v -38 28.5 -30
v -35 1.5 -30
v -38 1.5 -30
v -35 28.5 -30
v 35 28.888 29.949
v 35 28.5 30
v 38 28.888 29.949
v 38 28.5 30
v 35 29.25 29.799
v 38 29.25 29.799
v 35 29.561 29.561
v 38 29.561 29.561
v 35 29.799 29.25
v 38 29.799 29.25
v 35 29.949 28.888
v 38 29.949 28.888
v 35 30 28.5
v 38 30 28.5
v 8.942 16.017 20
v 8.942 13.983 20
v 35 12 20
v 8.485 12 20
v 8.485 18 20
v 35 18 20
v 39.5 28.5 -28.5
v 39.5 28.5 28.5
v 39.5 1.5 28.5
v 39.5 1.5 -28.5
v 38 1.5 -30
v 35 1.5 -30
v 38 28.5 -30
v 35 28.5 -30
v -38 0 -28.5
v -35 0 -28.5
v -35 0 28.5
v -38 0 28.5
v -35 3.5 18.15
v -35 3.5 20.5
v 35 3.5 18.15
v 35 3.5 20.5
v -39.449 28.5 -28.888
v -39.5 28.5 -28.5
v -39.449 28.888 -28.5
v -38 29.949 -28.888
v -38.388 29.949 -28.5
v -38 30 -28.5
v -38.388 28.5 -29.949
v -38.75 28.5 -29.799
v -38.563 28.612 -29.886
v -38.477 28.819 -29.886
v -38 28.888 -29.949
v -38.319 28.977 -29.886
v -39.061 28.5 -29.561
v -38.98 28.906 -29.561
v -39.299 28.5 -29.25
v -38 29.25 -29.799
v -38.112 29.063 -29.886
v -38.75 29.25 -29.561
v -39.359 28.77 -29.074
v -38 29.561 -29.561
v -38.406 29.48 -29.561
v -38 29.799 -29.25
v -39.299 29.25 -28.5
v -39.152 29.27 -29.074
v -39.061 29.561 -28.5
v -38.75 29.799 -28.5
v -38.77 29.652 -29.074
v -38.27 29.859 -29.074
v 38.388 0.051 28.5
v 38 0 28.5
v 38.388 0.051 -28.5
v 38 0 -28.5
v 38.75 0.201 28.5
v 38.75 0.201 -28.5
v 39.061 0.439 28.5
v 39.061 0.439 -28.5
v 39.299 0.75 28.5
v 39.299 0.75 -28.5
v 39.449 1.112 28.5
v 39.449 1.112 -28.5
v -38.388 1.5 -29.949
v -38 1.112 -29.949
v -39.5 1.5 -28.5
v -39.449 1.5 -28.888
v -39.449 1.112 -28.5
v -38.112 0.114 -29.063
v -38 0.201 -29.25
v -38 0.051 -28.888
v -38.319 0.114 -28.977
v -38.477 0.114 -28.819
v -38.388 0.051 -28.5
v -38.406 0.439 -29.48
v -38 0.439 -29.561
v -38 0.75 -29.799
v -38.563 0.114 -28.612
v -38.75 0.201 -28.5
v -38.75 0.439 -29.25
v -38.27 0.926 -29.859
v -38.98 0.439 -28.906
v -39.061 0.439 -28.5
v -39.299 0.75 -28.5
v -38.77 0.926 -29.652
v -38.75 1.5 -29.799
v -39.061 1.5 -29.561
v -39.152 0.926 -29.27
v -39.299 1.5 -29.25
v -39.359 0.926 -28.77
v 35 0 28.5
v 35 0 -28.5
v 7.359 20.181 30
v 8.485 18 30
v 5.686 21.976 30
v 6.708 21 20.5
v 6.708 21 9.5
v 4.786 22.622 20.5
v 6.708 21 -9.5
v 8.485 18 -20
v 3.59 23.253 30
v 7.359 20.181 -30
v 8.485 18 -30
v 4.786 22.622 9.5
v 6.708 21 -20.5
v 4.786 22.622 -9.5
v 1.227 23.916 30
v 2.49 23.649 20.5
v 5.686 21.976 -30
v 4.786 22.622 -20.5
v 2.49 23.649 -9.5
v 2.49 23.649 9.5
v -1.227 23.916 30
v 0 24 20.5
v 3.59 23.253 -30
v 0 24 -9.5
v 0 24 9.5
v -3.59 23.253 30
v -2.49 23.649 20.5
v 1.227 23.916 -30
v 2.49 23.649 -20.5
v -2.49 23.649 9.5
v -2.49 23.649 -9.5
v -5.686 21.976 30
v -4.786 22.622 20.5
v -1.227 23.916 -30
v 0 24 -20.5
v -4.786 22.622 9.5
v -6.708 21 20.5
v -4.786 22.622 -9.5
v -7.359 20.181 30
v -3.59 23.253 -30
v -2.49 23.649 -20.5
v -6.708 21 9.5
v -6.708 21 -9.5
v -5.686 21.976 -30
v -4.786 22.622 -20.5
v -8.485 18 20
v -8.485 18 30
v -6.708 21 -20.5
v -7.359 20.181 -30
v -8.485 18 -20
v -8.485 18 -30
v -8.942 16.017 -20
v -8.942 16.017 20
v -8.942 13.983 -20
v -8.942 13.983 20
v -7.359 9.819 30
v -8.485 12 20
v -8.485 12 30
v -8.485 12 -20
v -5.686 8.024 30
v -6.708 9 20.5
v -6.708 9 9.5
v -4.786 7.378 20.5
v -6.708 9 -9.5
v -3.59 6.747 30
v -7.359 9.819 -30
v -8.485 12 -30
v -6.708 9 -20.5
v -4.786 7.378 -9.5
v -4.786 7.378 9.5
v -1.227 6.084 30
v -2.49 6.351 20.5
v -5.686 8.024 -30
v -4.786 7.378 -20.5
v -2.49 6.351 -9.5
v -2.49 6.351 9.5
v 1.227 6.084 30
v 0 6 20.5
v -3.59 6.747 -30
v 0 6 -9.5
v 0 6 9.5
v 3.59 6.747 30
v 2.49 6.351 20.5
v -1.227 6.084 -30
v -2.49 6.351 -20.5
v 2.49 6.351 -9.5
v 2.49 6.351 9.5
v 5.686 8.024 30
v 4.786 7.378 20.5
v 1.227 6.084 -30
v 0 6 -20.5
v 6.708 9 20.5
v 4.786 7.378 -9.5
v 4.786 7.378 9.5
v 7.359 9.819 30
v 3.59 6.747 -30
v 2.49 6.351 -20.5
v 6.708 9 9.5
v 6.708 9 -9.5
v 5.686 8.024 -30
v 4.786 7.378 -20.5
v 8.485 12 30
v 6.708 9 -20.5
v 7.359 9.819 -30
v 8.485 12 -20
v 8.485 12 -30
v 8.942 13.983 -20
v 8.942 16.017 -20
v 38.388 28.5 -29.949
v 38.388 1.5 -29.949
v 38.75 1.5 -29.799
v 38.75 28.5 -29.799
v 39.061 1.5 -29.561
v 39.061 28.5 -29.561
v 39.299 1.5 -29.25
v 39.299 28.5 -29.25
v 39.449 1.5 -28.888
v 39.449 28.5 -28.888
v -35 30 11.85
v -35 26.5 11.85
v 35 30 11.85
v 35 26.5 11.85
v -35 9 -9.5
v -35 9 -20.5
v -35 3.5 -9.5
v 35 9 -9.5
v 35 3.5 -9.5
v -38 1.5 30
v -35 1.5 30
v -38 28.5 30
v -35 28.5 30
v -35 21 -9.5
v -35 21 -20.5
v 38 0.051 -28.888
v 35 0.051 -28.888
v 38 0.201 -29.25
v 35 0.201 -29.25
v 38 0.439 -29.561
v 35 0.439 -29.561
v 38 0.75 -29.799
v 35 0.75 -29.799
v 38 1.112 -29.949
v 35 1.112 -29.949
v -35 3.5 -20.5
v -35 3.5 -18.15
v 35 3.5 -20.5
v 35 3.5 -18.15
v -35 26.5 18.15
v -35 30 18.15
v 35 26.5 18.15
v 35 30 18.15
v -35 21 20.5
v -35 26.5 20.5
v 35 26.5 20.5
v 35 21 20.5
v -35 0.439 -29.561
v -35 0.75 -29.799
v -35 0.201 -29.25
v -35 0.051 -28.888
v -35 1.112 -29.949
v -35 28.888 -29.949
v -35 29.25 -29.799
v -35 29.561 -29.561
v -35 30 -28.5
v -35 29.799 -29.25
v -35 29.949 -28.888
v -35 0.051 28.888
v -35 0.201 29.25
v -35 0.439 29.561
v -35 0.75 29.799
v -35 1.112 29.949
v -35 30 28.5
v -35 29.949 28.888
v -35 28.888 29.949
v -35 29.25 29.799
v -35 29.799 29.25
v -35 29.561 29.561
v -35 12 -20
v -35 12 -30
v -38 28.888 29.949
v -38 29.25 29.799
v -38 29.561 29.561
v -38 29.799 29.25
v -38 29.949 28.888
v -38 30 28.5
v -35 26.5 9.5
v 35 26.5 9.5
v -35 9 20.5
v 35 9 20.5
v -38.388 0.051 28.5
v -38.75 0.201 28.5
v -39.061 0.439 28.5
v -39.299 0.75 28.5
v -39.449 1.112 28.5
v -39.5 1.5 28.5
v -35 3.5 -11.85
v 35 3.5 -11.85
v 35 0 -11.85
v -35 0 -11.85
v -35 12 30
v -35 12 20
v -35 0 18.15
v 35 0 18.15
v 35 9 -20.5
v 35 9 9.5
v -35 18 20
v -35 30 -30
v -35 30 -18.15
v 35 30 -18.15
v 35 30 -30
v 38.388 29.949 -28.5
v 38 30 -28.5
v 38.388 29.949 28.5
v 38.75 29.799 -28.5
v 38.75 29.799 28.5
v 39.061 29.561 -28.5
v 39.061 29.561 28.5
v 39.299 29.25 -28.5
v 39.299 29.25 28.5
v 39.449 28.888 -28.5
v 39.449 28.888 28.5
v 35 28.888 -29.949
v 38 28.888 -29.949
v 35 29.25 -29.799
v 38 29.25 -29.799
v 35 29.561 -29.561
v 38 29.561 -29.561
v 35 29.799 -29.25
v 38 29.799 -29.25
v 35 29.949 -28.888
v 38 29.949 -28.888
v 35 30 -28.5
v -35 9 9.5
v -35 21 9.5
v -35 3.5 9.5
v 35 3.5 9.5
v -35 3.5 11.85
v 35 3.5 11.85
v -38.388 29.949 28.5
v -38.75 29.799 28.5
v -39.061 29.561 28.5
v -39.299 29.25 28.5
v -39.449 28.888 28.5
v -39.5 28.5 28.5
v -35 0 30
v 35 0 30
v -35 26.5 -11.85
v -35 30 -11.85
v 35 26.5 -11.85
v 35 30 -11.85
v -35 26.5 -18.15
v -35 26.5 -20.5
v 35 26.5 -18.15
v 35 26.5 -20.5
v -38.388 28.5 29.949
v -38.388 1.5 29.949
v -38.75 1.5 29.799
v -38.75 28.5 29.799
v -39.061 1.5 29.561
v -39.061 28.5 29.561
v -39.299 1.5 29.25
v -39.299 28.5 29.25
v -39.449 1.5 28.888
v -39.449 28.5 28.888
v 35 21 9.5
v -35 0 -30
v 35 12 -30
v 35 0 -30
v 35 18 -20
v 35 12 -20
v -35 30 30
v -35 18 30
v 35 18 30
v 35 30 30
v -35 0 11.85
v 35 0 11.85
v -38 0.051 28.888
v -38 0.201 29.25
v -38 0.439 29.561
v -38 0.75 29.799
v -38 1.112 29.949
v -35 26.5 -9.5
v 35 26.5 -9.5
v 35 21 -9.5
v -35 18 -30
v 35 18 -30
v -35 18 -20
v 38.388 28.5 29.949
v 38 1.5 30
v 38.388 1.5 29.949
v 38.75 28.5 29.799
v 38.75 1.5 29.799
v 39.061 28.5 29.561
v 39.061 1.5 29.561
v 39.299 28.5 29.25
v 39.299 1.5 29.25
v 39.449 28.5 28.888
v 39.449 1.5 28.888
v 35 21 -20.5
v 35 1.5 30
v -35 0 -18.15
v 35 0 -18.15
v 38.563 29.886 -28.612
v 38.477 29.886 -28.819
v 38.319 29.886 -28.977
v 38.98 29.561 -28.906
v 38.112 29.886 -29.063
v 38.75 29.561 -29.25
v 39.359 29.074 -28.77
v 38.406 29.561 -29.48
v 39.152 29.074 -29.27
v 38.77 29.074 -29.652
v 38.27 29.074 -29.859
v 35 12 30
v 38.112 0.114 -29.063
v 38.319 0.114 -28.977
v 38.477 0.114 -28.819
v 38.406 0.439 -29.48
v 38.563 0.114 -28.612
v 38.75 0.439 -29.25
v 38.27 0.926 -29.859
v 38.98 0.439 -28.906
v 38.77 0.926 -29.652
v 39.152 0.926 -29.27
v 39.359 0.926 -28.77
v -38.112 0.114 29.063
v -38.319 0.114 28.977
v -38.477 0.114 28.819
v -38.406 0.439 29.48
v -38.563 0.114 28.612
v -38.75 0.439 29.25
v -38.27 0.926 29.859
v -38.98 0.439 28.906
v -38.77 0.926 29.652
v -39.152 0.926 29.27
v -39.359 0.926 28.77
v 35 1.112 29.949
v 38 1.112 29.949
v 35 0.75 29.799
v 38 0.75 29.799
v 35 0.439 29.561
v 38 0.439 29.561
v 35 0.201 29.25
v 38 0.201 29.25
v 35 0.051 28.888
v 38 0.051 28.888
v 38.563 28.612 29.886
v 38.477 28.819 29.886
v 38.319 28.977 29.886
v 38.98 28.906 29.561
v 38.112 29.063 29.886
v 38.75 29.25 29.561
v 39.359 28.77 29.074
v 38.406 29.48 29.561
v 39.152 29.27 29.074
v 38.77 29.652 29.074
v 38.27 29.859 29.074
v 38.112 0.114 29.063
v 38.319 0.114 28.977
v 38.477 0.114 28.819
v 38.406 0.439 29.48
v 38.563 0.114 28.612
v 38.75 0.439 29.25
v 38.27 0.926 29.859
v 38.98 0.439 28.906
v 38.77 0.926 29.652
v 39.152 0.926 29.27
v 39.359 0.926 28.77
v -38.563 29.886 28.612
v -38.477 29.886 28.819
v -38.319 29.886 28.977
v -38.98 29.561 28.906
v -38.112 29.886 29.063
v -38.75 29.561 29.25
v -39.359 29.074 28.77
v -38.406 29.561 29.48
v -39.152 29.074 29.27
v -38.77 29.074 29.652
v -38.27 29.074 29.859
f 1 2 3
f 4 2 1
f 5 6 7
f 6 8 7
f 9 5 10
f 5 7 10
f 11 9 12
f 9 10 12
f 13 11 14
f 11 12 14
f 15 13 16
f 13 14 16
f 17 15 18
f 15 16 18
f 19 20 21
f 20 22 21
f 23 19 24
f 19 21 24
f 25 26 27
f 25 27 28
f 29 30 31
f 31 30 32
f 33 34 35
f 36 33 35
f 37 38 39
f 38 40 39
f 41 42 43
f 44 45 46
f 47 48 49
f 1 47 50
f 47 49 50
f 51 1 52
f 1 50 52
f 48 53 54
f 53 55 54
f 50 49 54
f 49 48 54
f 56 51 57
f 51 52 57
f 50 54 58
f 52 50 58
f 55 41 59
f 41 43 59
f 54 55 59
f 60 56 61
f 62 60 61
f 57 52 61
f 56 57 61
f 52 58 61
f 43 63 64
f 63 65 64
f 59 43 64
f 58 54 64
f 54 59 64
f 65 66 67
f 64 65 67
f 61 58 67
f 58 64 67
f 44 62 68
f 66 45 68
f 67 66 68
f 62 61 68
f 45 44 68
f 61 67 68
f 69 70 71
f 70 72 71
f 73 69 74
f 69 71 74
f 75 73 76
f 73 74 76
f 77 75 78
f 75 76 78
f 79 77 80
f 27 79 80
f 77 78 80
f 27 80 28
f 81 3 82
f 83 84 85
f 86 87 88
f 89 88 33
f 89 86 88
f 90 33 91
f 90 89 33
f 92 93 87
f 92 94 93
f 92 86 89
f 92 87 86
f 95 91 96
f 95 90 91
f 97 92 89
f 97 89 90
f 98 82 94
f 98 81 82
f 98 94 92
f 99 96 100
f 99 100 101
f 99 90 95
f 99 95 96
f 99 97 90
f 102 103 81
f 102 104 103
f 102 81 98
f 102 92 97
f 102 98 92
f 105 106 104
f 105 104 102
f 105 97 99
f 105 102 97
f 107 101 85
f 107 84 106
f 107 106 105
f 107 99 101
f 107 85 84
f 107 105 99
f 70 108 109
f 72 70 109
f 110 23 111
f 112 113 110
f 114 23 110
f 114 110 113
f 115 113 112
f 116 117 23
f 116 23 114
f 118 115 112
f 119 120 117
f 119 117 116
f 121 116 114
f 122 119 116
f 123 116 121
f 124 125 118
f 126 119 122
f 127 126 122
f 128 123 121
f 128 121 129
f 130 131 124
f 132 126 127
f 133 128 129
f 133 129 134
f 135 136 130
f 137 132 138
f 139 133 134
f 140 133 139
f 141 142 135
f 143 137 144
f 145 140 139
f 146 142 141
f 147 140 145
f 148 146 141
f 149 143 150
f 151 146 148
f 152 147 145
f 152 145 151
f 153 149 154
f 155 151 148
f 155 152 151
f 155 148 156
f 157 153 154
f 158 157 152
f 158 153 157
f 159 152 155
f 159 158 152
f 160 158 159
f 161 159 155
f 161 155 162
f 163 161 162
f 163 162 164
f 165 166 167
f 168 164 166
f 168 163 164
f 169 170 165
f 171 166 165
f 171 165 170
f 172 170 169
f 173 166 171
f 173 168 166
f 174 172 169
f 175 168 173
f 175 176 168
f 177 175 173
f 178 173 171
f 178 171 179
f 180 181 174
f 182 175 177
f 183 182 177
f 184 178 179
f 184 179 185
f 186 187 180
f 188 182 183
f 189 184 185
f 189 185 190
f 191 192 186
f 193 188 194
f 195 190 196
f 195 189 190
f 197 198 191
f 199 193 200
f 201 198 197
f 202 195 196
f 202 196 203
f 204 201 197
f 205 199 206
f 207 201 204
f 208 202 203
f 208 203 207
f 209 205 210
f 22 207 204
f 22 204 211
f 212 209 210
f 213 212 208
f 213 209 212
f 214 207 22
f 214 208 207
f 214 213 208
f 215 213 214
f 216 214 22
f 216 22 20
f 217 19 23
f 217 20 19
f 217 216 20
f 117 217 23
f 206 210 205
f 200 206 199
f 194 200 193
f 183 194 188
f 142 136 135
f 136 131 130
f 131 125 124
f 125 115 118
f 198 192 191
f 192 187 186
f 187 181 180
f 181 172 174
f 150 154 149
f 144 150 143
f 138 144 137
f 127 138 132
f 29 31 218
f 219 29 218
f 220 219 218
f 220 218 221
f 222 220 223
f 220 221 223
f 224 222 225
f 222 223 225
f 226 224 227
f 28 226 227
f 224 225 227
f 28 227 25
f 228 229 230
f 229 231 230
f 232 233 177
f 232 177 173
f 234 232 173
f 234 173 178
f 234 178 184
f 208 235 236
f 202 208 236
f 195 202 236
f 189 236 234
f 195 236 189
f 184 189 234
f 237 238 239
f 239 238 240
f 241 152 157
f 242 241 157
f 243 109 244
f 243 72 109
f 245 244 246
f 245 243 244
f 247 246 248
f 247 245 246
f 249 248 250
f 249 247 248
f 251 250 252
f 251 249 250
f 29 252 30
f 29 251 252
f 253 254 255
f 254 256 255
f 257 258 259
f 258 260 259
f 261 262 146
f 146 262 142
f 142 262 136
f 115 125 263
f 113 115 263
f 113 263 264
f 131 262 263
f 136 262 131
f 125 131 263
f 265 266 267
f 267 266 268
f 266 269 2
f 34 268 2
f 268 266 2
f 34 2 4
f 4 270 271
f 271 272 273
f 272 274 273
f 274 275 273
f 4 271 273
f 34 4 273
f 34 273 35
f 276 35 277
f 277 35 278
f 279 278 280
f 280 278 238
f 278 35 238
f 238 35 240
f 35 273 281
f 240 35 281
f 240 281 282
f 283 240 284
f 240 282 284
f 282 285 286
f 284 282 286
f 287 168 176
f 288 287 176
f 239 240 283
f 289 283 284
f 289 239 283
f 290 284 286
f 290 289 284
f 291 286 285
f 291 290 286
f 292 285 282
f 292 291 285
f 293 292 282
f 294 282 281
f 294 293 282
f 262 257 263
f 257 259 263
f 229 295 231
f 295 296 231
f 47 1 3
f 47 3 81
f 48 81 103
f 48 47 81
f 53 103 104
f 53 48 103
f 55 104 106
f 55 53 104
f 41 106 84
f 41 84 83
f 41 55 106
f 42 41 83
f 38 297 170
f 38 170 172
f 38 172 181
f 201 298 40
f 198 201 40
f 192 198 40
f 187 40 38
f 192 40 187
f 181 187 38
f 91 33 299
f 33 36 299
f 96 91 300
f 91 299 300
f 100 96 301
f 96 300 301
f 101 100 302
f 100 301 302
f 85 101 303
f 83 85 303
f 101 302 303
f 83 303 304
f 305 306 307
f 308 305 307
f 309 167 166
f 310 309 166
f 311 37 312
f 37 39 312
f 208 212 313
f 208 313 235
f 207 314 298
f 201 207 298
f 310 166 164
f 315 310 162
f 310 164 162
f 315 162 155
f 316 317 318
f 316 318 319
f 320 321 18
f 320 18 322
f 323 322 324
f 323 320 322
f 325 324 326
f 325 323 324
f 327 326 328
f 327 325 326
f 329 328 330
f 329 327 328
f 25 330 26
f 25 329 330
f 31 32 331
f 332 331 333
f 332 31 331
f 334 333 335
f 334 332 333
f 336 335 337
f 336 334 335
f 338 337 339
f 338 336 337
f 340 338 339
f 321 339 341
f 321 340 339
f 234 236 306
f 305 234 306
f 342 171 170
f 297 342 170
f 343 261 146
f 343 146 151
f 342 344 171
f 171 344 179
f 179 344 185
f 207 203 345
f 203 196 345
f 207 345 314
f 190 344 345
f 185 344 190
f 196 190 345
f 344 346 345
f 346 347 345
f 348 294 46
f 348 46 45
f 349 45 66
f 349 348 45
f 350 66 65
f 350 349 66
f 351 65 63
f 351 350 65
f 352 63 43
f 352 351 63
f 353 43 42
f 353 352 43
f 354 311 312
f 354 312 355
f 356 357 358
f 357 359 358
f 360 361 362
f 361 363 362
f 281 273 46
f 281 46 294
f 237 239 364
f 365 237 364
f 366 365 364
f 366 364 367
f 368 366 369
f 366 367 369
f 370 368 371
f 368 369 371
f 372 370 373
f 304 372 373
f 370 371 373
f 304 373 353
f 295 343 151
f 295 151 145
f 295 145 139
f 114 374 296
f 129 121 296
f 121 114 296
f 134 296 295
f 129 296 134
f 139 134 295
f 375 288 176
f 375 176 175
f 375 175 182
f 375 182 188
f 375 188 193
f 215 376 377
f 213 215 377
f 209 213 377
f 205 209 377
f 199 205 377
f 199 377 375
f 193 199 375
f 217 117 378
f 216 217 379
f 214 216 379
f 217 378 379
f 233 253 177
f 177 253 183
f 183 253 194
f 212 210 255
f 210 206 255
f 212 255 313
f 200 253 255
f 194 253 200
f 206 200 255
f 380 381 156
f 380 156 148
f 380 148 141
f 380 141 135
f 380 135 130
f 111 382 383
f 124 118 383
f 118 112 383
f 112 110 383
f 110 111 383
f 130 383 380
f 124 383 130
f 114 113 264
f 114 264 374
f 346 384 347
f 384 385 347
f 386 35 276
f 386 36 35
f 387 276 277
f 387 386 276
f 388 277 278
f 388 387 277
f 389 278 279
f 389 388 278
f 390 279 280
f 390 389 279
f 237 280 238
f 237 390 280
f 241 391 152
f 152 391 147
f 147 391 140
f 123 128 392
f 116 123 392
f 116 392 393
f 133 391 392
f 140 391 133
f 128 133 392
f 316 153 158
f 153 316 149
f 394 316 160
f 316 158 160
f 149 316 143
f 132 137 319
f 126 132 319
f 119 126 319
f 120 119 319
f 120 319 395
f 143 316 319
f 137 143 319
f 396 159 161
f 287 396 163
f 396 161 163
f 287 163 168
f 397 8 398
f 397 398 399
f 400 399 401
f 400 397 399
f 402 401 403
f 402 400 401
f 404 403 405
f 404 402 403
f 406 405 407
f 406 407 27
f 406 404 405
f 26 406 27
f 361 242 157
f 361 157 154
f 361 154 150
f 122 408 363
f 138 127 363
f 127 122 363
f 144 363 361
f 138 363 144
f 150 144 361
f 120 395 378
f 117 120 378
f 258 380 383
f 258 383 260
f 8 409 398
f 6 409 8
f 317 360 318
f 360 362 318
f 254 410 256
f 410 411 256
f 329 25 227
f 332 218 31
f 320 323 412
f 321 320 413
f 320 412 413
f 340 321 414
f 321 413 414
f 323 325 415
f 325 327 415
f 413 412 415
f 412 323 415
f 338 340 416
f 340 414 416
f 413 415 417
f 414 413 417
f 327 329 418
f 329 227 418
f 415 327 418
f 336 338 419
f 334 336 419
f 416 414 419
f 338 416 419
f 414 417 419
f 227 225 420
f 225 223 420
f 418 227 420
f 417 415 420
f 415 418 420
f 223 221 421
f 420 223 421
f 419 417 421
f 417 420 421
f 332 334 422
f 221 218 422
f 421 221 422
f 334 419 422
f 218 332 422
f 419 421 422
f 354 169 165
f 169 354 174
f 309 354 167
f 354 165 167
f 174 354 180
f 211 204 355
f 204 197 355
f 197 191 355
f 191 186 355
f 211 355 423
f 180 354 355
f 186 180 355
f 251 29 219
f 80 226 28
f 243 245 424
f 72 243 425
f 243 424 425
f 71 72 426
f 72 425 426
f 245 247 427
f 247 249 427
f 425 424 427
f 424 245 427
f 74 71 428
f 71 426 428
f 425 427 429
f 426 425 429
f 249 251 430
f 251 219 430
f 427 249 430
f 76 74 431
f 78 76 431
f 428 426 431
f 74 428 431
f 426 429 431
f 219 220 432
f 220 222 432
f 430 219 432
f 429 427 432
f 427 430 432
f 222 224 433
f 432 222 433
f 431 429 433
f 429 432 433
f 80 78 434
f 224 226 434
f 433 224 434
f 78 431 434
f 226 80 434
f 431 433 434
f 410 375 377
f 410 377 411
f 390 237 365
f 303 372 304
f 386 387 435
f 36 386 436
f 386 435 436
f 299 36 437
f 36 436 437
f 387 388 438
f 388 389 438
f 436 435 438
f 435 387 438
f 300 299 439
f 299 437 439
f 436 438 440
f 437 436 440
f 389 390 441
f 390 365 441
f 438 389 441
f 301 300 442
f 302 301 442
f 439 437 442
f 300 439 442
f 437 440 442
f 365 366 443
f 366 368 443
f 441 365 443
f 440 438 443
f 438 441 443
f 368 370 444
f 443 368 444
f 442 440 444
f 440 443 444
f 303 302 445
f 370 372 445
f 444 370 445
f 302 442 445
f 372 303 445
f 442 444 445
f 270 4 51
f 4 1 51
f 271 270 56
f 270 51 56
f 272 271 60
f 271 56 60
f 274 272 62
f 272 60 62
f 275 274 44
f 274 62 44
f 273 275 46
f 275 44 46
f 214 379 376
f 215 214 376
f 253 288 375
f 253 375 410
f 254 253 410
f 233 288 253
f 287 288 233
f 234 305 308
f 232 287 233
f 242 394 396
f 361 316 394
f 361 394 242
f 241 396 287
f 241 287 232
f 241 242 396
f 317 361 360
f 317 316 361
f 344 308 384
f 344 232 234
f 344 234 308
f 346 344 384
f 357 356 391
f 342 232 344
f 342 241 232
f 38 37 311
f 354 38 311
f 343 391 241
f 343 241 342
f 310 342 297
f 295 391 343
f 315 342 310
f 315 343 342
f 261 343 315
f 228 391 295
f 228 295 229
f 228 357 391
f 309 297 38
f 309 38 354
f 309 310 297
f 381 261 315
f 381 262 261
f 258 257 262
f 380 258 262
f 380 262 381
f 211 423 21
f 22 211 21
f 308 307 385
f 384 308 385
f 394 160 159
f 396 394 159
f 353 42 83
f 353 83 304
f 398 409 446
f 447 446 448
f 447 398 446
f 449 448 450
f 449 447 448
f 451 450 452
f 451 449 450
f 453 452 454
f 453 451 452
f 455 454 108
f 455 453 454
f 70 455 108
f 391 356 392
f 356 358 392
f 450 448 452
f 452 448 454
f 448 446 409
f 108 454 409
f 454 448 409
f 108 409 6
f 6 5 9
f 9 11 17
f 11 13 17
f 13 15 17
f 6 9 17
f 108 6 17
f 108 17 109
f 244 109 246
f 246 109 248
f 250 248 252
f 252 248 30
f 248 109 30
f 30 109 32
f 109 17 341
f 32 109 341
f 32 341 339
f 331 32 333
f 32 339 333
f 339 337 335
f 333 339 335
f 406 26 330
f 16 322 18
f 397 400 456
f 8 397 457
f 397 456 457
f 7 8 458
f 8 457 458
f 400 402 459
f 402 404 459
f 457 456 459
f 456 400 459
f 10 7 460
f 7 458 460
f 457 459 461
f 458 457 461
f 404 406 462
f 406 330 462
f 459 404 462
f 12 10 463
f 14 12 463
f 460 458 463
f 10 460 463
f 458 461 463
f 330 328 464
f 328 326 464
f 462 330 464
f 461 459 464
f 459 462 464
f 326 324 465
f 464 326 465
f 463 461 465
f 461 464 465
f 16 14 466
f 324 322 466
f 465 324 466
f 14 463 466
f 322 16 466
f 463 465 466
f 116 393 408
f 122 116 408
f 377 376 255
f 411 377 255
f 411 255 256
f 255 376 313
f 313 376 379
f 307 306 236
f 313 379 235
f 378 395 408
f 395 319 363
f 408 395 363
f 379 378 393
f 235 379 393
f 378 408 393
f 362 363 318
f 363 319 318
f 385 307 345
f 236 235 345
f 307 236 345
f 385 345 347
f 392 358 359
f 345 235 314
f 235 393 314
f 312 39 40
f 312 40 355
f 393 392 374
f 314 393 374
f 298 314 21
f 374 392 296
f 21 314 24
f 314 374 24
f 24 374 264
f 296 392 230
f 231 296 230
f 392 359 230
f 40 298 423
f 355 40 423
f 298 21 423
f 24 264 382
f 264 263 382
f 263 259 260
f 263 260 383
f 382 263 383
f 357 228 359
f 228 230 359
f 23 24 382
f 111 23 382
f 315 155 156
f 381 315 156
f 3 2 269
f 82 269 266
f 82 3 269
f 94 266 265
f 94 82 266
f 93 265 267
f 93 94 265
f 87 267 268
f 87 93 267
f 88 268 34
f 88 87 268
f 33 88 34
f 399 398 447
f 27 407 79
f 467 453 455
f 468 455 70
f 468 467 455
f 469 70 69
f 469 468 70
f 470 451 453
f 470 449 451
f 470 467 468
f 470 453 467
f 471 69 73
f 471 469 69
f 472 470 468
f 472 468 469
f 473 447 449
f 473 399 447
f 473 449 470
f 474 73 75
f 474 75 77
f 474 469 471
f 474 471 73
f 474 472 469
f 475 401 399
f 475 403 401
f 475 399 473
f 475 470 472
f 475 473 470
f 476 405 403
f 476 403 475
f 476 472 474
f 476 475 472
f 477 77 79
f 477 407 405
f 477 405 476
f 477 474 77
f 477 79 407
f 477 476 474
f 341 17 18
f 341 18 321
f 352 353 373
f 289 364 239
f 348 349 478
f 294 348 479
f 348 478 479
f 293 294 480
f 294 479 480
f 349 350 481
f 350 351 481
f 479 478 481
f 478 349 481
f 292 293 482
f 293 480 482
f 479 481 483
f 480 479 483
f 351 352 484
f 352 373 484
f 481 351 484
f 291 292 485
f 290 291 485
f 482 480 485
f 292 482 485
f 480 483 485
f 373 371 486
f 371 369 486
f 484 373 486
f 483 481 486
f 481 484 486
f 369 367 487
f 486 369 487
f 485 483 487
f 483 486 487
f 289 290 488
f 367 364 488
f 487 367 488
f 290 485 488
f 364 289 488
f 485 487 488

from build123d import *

# Parameters (mm, degrees)
BOSS_EXTRUDE1_DEPTH     = 35
SKETCH2_W               = 60
SKETCH2_H               = 30
BOSS_EXTRUDE2_DEPTH     = 4.5
SKETCH3_W               = 60
SKETCH3_H               = 30
BOSS_EXTRUDE3_DEPTH     = 4.5
FILLET1_R               = 1.5
FILLET2_R               = 1.5
CUT_EXTRUDE1_DEPTH      = 58.9676634
CUT_EXTRUDE1_DEPTH_BACK = 58.9676634
SKETCH4_R               = 9


with BuildPart() as part:
    # Sketch1 → Boss-Extrude1 (new, symmetric)
    with BuildSketch(Plane(origin=(0, 0, 0), x_dir=(0, 0, -1), z_dir=(1, 0, 0))):
        Polygon((11.85, 0), (-11.85, 0), (-11.85, 3.5), (-9.5, 3.5), (-9.5, 9), (-20.5, 9), (-20.5, 3.5), (-18.15, 3.5), (-18.15, 0), (-30, 0), (-30, 12), (-20, 12), (-20, 18), (-30, 18), (-30, 30), (-18.15, 30), (-18.15, 26.5), (-20.5, 26.5), (-20.5, 21), (-9.5, 21), (-9.5, 26.5), (-11.85, 26.5), (-11.85, 30), (11.85, 30), (11.85, 26.5), (9.5, 26.5), (9.5, 21), (20.5, 21), (20.5, 26.5), (18.15, 26.5), (18.15, 30), (30, 30), (30, 18), (20, 18), (20, 12), (30, 12), (30, 0), (18.15, 0), (18.15, 3.5), (20.5, 3.5), (20.5, 9), (9.5, 9), (9.5, 3.5), (11.85, 3.5), align=None)
    extrude(amount=BOSS_EXTRUDE1_DEPTH, both=True)

    # Sketch4 → Cut-Extrude1 (cut, two sides: drawn at the far end of the back side and taken through both)
    with BuildSketch(Plane.XY.offset(-CUT_EXTRUDE1_DEPTH_BACK)):
        with Locations(Location((0, 15, 0), (0, 0, 19.471220634))):
            Circle(SKETCH4_R)
    extrude(amount=CUT_EXTRUDE1_DEPTH + CUT_EXTRUDE1_DEPTH_BACK, mode=Mode.SUBTRACT)


with BuildPart() as body_2:
    # Sketch2 → Boss-Extrude2 (new body)
    with BuildSketch(Plane(origin=(35, 0, 0), x_dir=(0, 0, -1), z_dir=(1, 0, 0))):
        with Locations((0, 15)):
            Rectangle(SKETCH2_W, SKETCH2_H)
    extrude(amount=BOSS_EXTRUDE2_DEPTH)

    # Fillet2
    fillet2_edges = [body_2.edges().sort_by_distance(p)[0] for p in [
        (39.5, 15, -30),
        (39.5, 30, 0),
        (39.5, 15, 30),
        (37.25, 30, 30),
        (37.25, 30, -30),
        (37.25, 0, -30),
        (37.25, 0, 30),
        (39.5, 0, 0),
    ]]
    fillet(fillet2_edges, radius=FILLET2_R)


with BuildPart() as body_3:
    # Sketch3 → Boss-Extrude3 (new body)
    with BuildSketch(Plane.ZY.offset(35)):
        with Locations((0, 15)):
            Rectangle(SKETCH3_W, SKETCH3_H)
    extrude(amount=BOSS_EXTRUDE3_DEPTH)

    # Fillet1
    fillet1_edges = [body_3.edges().sort_by_distance(p)[0] for p in [
        (-39.5, 15, 30),
        (-39.5, 30, 0),
        (-39.5, 15, -30),
        (-37.25, 30, -30),
        (-37.25, 30, 30),
        (-37.25, 0, 30),
        (-37.25, 0, -30),
        (-39.5, 0, 0),
    ]]
    fillet(fillet1_edges, radius=FILLET1_R)


solid = Compound([part.part, body_2.part, body_3.part])
